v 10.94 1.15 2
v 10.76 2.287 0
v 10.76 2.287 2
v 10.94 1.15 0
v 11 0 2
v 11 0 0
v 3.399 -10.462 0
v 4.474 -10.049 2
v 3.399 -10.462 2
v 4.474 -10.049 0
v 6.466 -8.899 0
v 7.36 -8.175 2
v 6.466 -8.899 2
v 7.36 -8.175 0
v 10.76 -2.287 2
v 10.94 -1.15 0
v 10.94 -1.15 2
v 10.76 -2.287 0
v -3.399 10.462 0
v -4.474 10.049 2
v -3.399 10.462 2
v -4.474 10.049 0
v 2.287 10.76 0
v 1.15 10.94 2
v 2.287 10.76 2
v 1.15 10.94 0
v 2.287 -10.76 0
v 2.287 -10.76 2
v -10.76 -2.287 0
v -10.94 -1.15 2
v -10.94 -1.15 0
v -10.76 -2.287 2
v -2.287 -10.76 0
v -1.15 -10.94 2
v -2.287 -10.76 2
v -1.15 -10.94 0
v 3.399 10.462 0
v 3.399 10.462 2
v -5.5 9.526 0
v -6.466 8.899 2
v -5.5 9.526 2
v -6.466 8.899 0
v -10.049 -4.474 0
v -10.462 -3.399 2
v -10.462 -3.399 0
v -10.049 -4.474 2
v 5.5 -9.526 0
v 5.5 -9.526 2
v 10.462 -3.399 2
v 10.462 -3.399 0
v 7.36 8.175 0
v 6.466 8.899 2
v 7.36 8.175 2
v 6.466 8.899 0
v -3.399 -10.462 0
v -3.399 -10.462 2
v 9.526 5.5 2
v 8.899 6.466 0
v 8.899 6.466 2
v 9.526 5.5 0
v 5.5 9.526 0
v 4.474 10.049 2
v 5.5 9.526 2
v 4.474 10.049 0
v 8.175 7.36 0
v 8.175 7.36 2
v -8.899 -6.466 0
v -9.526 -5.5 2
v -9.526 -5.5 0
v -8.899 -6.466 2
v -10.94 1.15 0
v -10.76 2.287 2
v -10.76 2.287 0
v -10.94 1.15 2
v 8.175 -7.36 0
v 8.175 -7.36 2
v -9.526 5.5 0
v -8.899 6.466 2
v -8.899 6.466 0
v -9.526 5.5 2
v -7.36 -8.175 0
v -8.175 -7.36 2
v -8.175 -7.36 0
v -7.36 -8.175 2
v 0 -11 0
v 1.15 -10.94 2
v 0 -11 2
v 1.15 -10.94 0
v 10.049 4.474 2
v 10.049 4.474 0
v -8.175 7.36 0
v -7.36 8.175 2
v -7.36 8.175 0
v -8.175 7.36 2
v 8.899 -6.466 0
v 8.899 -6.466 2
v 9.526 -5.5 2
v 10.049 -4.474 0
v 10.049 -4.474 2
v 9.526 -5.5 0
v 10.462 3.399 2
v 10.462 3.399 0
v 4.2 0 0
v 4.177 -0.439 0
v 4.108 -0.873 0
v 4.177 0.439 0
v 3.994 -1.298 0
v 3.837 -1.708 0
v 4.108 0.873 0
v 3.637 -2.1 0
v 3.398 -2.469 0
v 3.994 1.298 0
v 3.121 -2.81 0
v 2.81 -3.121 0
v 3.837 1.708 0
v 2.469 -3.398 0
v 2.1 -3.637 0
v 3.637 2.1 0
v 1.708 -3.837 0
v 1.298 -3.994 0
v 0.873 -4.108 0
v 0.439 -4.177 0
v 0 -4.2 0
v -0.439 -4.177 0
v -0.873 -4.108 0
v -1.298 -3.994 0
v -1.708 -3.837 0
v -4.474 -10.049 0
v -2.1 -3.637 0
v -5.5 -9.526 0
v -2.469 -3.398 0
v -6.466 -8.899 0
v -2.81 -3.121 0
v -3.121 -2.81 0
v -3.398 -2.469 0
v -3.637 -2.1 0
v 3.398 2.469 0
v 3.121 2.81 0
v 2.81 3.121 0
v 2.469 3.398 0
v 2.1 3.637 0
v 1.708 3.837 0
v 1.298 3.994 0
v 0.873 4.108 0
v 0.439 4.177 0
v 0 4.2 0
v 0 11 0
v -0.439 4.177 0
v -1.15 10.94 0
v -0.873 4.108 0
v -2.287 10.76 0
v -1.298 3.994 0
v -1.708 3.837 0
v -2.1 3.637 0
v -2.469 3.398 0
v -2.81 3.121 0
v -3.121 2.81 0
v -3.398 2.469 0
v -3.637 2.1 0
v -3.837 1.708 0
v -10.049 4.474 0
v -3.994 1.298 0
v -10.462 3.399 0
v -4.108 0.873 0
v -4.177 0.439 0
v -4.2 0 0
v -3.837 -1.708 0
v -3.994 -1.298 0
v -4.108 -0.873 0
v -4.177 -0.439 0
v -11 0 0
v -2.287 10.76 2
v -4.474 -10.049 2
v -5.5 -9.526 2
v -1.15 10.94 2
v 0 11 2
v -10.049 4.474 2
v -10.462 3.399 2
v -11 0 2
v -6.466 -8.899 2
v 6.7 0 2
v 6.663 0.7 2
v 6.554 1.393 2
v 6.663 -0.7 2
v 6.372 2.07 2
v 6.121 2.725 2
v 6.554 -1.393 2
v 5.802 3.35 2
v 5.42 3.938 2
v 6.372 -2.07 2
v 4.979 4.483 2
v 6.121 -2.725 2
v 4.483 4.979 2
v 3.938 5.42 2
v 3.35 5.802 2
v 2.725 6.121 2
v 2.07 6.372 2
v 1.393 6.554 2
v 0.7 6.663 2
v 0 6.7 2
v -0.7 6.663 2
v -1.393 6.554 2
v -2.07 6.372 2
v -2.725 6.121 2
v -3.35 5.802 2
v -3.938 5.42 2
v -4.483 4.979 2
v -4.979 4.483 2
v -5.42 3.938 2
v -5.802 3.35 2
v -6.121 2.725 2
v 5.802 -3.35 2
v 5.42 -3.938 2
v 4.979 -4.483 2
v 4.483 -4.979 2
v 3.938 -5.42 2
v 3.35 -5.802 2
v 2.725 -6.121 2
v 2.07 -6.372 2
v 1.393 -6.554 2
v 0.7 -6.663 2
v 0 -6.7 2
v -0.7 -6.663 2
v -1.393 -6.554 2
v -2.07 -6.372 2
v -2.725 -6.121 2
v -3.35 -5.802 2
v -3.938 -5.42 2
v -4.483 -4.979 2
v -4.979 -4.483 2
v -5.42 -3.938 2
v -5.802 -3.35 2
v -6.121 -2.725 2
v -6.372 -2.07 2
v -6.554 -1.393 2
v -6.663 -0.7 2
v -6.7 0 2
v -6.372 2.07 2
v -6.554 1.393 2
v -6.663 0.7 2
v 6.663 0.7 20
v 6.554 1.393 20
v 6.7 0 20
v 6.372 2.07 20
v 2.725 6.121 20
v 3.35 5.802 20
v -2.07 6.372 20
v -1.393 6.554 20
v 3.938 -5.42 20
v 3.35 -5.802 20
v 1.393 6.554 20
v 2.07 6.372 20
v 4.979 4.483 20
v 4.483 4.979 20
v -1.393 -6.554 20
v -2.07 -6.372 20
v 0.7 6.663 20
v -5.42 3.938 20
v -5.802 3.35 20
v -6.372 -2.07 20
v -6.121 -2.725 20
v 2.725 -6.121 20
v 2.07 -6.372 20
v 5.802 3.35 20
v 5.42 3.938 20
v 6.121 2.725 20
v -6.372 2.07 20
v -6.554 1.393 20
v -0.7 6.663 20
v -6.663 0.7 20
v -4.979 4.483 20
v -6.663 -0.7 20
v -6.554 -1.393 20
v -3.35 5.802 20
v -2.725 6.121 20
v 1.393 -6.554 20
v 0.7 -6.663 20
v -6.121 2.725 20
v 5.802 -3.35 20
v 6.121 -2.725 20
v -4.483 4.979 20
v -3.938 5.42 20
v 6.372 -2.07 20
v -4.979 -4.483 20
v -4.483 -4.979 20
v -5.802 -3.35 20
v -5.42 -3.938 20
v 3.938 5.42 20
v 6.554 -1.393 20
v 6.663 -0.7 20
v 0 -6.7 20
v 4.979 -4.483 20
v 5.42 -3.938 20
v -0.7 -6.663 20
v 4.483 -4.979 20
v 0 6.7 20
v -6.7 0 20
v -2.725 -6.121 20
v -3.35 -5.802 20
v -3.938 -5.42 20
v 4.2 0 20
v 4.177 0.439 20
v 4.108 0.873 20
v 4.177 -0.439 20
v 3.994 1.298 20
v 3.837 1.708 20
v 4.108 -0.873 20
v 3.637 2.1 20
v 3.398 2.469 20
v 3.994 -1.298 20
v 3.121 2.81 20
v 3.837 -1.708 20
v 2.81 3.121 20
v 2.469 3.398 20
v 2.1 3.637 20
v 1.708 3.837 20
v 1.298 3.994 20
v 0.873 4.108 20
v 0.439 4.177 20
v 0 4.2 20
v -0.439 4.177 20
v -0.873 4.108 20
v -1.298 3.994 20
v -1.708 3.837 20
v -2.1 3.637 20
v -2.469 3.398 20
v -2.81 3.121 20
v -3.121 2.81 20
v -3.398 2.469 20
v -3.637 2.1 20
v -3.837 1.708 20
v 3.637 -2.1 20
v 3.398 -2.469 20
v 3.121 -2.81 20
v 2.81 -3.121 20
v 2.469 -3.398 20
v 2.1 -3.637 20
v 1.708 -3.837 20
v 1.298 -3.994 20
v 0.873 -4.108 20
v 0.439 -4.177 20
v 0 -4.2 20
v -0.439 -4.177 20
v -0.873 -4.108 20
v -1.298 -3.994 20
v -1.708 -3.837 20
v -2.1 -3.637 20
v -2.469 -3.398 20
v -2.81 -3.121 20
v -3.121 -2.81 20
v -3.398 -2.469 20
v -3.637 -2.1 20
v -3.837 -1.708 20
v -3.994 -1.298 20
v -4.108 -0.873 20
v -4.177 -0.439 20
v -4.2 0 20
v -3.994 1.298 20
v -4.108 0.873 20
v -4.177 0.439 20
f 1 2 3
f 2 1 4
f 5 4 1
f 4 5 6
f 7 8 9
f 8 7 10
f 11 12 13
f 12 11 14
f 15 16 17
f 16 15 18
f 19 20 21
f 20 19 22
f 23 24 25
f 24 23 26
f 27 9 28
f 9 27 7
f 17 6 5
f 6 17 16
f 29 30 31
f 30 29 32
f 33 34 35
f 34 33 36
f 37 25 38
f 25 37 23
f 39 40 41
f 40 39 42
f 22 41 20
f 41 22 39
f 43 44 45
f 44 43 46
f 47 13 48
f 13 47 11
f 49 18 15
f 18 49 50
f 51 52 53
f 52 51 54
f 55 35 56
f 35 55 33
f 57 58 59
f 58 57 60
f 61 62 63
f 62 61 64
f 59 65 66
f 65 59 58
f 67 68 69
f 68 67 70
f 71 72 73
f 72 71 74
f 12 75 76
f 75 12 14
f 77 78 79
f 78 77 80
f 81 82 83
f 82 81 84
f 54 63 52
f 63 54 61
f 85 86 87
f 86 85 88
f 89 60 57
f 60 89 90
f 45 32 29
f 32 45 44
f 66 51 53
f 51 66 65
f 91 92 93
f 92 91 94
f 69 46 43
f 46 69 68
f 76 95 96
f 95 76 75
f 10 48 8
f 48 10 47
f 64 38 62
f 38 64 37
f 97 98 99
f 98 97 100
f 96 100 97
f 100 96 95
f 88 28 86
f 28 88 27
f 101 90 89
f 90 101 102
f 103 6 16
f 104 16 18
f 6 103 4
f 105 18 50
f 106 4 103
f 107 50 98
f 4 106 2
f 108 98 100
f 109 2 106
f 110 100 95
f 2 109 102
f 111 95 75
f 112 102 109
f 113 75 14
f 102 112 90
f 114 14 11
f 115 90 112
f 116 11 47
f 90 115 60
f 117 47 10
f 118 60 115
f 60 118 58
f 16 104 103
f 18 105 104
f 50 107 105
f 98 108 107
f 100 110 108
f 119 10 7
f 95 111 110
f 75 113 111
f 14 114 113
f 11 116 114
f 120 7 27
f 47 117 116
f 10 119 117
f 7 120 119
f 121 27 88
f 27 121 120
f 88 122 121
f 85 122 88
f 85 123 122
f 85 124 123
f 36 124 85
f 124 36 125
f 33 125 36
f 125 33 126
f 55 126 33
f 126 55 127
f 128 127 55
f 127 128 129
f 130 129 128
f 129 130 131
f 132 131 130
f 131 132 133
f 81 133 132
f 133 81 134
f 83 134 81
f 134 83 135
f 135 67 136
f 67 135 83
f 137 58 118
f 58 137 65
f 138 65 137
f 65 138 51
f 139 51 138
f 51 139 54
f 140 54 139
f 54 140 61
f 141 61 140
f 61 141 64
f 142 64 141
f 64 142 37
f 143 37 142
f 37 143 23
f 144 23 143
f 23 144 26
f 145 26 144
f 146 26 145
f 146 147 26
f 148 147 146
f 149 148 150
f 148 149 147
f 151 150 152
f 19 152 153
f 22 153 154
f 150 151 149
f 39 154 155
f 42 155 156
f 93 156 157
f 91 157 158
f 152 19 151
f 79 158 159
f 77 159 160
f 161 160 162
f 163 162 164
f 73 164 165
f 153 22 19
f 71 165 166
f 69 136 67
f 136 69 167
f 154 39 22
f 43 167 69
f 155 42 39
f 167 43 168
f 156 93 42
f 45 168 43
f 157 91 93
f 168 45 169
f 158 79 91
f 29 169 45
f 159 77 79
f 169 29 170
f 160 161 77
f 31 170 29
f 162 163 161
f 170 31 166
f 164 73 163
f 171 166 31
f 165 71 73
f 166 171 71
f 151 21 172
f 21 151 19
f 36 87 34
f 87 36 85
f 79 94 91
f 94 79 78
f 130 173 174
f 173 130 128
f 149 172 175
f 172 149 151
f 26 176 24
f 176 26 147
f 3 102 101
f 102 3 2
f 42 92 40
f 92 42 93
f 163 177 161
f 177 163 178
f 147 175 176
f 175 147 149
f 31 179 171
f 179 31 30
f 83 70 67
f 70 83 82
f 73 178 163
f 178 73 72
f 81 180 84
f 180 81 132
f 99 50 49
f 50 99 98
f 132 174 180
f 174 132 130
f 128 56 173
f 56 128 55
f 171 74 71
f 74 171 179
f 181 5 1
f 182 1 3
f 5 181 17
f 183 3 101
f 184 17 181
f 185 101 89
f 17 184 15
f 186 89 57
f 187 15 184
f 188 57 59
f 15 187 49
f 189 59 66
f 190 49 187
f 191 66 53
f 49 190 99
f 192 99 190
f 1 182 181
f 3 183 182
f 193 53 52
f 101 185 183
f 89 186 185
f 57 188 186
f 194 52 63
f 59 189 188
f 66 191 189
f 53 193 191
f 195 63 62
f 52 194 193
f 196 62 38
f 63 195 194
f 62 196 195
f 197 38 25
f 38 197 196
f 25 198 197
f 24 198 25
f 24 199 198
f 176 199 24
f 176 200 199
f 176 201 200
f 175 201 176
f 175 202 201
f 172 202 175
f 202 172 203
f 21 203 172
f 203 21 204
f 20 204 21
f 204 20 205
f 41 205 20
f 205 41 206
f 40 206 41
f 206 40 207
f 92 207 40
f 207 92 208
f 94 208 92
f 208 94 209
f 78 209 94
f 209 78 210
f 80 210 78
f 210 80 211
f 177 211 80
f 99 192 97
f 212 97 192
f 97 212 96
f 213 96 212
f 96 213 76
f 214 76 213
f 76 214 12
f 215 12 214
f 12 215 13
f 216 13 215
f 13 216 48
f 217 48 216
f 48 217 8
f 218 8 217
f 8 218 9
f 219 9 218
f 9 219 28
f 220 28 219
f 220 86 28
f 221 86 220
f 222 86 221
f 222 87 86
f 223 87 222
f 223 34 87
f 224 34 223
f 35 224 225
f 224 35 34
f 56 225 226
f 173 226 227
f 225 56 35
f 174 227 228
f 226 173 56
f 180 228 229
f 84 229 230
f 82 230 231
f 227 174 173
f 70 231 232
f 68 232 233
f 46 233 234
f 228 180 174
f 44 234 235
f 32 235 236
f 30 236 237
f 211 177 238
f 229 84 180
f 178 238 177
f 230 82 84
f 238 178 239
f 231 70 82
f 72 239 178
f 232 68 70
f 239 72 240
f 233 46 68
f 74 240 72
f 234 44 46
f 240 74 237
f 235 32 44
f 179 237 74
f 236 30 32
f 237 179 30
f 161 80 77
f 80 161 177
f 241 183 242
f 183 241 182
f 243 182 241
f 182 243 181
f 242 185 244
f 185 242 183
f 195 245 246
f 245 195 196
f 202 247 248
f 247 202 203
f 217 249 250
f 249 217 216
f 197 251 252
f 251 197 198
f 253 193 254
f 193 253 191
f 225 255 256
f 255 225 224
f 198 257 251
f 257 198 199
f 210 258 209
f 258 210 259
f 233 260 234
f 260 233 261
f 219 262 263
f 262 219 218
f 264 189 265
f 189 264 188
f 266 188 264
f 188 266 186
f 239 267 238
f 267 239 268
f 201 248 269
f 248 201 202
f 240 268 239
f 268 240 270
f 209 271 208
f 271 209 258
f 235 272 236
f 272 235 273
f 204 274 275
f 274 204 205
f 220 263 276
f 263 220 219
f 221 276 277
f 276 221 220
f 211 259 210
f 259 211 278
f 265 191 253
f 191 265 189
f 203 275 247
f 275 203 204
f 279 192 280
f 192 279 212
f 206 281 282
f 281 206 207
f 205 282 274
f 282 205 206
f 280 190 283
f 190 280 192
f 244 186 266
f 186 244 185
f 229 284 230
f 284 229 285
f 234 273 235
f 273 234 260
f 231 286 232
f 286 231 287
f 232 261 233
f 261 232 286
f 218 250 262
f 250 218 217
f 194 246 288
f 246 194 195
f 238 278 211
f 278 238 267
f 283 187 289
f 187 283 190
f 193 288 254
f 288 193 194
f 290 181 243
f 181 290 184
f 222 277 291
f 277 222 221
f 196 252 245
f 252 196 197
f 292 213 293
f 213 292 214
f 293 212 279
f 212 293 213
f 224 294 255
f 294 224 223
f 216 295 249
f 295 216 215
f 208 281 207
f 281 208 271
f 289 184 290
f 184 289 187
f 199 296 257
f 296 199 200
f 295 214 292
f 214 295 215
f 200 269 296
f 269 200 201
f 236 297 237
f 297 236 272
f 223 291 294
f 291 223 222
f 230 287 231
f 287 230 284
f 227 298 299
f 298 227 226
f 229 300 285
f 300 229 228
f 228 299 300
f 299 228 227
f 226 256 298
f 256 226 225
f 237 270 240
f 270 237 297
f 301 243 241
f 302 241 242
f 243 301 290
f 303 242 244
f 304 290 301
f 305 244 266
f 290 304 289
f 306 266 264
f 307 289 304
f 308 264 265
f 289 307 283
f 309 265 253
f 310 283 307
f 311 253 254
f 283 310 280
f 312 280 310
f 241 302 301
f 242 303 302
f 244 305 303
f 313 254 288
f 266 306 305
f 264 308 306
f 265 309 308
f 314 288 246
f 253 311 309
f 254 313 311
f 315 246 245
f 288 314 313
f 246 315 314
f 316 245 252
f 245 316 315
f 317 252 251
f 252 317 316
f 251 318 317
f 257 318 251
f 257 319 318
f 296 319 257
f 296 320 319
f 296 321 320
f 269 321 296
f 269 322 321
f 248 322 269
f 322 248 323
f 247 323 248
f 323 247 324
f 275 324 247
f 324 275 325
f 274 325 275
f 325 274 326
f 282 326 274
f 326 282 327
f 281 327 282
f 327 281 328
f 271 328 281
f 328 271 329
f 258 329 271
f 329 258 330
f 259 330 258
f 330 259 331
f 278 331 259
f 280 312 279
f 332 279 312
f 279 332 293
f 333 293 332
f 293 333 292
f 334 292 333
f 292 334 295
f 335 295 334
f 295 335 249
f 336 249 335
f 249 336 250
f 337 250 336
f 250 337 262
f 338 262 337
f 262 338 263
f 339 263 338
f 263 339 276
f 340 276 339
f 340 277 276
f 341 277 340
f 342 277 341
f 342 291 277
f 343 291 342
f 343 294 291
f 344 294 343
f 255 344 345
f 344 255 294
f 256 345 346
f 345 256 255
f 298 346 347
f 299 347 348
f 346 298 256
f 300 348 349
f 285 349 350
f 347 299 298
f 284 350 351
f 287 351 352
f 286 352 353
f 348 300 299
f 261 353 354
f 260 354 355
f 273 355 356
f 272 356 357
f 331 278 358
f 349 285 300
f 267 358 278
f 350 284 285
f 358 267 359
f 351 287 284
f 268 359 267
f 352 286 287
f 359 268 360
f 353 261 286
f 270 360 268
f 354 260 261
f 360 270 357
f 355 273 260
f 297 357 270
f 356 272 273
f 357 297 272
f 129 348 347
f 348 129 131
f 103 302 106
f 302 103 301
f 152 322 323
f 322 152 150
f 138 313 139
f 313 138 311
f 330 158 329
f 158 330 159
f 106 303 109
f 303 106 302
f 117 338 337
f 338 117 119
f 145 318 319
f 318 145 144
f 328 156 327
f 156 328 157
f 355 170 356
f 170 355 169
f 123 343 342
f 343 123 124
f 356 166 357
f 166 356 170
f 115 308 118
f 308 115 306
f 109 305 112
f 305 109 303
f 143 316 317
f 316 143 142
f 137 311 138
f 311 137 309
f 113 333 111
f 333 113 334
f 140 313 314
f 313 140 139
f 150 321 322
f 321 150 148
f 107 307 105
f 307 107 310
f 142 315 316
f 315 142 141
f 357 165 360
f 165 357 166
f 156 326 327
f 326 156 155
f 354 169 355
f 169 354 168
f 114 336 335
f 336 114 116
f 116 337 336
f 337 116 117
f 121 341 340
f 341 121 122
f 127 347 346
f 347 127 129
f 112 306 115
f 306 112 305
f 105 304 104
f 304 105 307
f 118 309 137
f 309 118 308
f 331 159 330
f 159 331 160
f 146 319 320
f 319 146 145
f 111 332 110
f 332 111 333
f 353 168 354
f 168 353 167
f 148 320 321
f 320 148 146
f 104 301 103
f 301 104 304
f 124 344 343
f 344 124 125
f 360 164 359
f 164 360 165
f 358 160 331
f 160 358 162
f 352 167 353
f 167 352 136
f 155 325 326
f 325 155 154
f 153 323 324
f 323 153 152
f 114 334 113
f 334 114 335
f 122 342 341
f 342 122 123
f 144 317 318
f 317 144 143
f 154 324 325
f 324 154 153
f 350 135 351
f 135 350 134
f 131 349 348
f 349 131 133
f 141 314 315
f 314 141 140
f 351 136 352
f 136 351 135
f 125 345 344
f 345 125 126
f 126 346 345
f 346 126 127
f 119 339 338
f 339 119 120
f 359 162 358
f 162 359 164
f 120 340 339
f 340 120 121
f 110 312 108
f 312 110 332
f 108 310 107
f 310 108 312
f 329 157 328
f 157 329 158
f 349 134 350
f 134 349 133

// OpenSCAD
// Wall-mount standoff with screw flange.
$fn = 60;
eps = 0.02;
thread_d = 8.4;
base_d = 22;
length = 20;
difference() { union() { cylinder(d=base_d,h=2); cylinder(d=thread_d+5,h=length); } translate([0,0,-eps]) cylinder(d=thread_d,h=length+2*eps); }
